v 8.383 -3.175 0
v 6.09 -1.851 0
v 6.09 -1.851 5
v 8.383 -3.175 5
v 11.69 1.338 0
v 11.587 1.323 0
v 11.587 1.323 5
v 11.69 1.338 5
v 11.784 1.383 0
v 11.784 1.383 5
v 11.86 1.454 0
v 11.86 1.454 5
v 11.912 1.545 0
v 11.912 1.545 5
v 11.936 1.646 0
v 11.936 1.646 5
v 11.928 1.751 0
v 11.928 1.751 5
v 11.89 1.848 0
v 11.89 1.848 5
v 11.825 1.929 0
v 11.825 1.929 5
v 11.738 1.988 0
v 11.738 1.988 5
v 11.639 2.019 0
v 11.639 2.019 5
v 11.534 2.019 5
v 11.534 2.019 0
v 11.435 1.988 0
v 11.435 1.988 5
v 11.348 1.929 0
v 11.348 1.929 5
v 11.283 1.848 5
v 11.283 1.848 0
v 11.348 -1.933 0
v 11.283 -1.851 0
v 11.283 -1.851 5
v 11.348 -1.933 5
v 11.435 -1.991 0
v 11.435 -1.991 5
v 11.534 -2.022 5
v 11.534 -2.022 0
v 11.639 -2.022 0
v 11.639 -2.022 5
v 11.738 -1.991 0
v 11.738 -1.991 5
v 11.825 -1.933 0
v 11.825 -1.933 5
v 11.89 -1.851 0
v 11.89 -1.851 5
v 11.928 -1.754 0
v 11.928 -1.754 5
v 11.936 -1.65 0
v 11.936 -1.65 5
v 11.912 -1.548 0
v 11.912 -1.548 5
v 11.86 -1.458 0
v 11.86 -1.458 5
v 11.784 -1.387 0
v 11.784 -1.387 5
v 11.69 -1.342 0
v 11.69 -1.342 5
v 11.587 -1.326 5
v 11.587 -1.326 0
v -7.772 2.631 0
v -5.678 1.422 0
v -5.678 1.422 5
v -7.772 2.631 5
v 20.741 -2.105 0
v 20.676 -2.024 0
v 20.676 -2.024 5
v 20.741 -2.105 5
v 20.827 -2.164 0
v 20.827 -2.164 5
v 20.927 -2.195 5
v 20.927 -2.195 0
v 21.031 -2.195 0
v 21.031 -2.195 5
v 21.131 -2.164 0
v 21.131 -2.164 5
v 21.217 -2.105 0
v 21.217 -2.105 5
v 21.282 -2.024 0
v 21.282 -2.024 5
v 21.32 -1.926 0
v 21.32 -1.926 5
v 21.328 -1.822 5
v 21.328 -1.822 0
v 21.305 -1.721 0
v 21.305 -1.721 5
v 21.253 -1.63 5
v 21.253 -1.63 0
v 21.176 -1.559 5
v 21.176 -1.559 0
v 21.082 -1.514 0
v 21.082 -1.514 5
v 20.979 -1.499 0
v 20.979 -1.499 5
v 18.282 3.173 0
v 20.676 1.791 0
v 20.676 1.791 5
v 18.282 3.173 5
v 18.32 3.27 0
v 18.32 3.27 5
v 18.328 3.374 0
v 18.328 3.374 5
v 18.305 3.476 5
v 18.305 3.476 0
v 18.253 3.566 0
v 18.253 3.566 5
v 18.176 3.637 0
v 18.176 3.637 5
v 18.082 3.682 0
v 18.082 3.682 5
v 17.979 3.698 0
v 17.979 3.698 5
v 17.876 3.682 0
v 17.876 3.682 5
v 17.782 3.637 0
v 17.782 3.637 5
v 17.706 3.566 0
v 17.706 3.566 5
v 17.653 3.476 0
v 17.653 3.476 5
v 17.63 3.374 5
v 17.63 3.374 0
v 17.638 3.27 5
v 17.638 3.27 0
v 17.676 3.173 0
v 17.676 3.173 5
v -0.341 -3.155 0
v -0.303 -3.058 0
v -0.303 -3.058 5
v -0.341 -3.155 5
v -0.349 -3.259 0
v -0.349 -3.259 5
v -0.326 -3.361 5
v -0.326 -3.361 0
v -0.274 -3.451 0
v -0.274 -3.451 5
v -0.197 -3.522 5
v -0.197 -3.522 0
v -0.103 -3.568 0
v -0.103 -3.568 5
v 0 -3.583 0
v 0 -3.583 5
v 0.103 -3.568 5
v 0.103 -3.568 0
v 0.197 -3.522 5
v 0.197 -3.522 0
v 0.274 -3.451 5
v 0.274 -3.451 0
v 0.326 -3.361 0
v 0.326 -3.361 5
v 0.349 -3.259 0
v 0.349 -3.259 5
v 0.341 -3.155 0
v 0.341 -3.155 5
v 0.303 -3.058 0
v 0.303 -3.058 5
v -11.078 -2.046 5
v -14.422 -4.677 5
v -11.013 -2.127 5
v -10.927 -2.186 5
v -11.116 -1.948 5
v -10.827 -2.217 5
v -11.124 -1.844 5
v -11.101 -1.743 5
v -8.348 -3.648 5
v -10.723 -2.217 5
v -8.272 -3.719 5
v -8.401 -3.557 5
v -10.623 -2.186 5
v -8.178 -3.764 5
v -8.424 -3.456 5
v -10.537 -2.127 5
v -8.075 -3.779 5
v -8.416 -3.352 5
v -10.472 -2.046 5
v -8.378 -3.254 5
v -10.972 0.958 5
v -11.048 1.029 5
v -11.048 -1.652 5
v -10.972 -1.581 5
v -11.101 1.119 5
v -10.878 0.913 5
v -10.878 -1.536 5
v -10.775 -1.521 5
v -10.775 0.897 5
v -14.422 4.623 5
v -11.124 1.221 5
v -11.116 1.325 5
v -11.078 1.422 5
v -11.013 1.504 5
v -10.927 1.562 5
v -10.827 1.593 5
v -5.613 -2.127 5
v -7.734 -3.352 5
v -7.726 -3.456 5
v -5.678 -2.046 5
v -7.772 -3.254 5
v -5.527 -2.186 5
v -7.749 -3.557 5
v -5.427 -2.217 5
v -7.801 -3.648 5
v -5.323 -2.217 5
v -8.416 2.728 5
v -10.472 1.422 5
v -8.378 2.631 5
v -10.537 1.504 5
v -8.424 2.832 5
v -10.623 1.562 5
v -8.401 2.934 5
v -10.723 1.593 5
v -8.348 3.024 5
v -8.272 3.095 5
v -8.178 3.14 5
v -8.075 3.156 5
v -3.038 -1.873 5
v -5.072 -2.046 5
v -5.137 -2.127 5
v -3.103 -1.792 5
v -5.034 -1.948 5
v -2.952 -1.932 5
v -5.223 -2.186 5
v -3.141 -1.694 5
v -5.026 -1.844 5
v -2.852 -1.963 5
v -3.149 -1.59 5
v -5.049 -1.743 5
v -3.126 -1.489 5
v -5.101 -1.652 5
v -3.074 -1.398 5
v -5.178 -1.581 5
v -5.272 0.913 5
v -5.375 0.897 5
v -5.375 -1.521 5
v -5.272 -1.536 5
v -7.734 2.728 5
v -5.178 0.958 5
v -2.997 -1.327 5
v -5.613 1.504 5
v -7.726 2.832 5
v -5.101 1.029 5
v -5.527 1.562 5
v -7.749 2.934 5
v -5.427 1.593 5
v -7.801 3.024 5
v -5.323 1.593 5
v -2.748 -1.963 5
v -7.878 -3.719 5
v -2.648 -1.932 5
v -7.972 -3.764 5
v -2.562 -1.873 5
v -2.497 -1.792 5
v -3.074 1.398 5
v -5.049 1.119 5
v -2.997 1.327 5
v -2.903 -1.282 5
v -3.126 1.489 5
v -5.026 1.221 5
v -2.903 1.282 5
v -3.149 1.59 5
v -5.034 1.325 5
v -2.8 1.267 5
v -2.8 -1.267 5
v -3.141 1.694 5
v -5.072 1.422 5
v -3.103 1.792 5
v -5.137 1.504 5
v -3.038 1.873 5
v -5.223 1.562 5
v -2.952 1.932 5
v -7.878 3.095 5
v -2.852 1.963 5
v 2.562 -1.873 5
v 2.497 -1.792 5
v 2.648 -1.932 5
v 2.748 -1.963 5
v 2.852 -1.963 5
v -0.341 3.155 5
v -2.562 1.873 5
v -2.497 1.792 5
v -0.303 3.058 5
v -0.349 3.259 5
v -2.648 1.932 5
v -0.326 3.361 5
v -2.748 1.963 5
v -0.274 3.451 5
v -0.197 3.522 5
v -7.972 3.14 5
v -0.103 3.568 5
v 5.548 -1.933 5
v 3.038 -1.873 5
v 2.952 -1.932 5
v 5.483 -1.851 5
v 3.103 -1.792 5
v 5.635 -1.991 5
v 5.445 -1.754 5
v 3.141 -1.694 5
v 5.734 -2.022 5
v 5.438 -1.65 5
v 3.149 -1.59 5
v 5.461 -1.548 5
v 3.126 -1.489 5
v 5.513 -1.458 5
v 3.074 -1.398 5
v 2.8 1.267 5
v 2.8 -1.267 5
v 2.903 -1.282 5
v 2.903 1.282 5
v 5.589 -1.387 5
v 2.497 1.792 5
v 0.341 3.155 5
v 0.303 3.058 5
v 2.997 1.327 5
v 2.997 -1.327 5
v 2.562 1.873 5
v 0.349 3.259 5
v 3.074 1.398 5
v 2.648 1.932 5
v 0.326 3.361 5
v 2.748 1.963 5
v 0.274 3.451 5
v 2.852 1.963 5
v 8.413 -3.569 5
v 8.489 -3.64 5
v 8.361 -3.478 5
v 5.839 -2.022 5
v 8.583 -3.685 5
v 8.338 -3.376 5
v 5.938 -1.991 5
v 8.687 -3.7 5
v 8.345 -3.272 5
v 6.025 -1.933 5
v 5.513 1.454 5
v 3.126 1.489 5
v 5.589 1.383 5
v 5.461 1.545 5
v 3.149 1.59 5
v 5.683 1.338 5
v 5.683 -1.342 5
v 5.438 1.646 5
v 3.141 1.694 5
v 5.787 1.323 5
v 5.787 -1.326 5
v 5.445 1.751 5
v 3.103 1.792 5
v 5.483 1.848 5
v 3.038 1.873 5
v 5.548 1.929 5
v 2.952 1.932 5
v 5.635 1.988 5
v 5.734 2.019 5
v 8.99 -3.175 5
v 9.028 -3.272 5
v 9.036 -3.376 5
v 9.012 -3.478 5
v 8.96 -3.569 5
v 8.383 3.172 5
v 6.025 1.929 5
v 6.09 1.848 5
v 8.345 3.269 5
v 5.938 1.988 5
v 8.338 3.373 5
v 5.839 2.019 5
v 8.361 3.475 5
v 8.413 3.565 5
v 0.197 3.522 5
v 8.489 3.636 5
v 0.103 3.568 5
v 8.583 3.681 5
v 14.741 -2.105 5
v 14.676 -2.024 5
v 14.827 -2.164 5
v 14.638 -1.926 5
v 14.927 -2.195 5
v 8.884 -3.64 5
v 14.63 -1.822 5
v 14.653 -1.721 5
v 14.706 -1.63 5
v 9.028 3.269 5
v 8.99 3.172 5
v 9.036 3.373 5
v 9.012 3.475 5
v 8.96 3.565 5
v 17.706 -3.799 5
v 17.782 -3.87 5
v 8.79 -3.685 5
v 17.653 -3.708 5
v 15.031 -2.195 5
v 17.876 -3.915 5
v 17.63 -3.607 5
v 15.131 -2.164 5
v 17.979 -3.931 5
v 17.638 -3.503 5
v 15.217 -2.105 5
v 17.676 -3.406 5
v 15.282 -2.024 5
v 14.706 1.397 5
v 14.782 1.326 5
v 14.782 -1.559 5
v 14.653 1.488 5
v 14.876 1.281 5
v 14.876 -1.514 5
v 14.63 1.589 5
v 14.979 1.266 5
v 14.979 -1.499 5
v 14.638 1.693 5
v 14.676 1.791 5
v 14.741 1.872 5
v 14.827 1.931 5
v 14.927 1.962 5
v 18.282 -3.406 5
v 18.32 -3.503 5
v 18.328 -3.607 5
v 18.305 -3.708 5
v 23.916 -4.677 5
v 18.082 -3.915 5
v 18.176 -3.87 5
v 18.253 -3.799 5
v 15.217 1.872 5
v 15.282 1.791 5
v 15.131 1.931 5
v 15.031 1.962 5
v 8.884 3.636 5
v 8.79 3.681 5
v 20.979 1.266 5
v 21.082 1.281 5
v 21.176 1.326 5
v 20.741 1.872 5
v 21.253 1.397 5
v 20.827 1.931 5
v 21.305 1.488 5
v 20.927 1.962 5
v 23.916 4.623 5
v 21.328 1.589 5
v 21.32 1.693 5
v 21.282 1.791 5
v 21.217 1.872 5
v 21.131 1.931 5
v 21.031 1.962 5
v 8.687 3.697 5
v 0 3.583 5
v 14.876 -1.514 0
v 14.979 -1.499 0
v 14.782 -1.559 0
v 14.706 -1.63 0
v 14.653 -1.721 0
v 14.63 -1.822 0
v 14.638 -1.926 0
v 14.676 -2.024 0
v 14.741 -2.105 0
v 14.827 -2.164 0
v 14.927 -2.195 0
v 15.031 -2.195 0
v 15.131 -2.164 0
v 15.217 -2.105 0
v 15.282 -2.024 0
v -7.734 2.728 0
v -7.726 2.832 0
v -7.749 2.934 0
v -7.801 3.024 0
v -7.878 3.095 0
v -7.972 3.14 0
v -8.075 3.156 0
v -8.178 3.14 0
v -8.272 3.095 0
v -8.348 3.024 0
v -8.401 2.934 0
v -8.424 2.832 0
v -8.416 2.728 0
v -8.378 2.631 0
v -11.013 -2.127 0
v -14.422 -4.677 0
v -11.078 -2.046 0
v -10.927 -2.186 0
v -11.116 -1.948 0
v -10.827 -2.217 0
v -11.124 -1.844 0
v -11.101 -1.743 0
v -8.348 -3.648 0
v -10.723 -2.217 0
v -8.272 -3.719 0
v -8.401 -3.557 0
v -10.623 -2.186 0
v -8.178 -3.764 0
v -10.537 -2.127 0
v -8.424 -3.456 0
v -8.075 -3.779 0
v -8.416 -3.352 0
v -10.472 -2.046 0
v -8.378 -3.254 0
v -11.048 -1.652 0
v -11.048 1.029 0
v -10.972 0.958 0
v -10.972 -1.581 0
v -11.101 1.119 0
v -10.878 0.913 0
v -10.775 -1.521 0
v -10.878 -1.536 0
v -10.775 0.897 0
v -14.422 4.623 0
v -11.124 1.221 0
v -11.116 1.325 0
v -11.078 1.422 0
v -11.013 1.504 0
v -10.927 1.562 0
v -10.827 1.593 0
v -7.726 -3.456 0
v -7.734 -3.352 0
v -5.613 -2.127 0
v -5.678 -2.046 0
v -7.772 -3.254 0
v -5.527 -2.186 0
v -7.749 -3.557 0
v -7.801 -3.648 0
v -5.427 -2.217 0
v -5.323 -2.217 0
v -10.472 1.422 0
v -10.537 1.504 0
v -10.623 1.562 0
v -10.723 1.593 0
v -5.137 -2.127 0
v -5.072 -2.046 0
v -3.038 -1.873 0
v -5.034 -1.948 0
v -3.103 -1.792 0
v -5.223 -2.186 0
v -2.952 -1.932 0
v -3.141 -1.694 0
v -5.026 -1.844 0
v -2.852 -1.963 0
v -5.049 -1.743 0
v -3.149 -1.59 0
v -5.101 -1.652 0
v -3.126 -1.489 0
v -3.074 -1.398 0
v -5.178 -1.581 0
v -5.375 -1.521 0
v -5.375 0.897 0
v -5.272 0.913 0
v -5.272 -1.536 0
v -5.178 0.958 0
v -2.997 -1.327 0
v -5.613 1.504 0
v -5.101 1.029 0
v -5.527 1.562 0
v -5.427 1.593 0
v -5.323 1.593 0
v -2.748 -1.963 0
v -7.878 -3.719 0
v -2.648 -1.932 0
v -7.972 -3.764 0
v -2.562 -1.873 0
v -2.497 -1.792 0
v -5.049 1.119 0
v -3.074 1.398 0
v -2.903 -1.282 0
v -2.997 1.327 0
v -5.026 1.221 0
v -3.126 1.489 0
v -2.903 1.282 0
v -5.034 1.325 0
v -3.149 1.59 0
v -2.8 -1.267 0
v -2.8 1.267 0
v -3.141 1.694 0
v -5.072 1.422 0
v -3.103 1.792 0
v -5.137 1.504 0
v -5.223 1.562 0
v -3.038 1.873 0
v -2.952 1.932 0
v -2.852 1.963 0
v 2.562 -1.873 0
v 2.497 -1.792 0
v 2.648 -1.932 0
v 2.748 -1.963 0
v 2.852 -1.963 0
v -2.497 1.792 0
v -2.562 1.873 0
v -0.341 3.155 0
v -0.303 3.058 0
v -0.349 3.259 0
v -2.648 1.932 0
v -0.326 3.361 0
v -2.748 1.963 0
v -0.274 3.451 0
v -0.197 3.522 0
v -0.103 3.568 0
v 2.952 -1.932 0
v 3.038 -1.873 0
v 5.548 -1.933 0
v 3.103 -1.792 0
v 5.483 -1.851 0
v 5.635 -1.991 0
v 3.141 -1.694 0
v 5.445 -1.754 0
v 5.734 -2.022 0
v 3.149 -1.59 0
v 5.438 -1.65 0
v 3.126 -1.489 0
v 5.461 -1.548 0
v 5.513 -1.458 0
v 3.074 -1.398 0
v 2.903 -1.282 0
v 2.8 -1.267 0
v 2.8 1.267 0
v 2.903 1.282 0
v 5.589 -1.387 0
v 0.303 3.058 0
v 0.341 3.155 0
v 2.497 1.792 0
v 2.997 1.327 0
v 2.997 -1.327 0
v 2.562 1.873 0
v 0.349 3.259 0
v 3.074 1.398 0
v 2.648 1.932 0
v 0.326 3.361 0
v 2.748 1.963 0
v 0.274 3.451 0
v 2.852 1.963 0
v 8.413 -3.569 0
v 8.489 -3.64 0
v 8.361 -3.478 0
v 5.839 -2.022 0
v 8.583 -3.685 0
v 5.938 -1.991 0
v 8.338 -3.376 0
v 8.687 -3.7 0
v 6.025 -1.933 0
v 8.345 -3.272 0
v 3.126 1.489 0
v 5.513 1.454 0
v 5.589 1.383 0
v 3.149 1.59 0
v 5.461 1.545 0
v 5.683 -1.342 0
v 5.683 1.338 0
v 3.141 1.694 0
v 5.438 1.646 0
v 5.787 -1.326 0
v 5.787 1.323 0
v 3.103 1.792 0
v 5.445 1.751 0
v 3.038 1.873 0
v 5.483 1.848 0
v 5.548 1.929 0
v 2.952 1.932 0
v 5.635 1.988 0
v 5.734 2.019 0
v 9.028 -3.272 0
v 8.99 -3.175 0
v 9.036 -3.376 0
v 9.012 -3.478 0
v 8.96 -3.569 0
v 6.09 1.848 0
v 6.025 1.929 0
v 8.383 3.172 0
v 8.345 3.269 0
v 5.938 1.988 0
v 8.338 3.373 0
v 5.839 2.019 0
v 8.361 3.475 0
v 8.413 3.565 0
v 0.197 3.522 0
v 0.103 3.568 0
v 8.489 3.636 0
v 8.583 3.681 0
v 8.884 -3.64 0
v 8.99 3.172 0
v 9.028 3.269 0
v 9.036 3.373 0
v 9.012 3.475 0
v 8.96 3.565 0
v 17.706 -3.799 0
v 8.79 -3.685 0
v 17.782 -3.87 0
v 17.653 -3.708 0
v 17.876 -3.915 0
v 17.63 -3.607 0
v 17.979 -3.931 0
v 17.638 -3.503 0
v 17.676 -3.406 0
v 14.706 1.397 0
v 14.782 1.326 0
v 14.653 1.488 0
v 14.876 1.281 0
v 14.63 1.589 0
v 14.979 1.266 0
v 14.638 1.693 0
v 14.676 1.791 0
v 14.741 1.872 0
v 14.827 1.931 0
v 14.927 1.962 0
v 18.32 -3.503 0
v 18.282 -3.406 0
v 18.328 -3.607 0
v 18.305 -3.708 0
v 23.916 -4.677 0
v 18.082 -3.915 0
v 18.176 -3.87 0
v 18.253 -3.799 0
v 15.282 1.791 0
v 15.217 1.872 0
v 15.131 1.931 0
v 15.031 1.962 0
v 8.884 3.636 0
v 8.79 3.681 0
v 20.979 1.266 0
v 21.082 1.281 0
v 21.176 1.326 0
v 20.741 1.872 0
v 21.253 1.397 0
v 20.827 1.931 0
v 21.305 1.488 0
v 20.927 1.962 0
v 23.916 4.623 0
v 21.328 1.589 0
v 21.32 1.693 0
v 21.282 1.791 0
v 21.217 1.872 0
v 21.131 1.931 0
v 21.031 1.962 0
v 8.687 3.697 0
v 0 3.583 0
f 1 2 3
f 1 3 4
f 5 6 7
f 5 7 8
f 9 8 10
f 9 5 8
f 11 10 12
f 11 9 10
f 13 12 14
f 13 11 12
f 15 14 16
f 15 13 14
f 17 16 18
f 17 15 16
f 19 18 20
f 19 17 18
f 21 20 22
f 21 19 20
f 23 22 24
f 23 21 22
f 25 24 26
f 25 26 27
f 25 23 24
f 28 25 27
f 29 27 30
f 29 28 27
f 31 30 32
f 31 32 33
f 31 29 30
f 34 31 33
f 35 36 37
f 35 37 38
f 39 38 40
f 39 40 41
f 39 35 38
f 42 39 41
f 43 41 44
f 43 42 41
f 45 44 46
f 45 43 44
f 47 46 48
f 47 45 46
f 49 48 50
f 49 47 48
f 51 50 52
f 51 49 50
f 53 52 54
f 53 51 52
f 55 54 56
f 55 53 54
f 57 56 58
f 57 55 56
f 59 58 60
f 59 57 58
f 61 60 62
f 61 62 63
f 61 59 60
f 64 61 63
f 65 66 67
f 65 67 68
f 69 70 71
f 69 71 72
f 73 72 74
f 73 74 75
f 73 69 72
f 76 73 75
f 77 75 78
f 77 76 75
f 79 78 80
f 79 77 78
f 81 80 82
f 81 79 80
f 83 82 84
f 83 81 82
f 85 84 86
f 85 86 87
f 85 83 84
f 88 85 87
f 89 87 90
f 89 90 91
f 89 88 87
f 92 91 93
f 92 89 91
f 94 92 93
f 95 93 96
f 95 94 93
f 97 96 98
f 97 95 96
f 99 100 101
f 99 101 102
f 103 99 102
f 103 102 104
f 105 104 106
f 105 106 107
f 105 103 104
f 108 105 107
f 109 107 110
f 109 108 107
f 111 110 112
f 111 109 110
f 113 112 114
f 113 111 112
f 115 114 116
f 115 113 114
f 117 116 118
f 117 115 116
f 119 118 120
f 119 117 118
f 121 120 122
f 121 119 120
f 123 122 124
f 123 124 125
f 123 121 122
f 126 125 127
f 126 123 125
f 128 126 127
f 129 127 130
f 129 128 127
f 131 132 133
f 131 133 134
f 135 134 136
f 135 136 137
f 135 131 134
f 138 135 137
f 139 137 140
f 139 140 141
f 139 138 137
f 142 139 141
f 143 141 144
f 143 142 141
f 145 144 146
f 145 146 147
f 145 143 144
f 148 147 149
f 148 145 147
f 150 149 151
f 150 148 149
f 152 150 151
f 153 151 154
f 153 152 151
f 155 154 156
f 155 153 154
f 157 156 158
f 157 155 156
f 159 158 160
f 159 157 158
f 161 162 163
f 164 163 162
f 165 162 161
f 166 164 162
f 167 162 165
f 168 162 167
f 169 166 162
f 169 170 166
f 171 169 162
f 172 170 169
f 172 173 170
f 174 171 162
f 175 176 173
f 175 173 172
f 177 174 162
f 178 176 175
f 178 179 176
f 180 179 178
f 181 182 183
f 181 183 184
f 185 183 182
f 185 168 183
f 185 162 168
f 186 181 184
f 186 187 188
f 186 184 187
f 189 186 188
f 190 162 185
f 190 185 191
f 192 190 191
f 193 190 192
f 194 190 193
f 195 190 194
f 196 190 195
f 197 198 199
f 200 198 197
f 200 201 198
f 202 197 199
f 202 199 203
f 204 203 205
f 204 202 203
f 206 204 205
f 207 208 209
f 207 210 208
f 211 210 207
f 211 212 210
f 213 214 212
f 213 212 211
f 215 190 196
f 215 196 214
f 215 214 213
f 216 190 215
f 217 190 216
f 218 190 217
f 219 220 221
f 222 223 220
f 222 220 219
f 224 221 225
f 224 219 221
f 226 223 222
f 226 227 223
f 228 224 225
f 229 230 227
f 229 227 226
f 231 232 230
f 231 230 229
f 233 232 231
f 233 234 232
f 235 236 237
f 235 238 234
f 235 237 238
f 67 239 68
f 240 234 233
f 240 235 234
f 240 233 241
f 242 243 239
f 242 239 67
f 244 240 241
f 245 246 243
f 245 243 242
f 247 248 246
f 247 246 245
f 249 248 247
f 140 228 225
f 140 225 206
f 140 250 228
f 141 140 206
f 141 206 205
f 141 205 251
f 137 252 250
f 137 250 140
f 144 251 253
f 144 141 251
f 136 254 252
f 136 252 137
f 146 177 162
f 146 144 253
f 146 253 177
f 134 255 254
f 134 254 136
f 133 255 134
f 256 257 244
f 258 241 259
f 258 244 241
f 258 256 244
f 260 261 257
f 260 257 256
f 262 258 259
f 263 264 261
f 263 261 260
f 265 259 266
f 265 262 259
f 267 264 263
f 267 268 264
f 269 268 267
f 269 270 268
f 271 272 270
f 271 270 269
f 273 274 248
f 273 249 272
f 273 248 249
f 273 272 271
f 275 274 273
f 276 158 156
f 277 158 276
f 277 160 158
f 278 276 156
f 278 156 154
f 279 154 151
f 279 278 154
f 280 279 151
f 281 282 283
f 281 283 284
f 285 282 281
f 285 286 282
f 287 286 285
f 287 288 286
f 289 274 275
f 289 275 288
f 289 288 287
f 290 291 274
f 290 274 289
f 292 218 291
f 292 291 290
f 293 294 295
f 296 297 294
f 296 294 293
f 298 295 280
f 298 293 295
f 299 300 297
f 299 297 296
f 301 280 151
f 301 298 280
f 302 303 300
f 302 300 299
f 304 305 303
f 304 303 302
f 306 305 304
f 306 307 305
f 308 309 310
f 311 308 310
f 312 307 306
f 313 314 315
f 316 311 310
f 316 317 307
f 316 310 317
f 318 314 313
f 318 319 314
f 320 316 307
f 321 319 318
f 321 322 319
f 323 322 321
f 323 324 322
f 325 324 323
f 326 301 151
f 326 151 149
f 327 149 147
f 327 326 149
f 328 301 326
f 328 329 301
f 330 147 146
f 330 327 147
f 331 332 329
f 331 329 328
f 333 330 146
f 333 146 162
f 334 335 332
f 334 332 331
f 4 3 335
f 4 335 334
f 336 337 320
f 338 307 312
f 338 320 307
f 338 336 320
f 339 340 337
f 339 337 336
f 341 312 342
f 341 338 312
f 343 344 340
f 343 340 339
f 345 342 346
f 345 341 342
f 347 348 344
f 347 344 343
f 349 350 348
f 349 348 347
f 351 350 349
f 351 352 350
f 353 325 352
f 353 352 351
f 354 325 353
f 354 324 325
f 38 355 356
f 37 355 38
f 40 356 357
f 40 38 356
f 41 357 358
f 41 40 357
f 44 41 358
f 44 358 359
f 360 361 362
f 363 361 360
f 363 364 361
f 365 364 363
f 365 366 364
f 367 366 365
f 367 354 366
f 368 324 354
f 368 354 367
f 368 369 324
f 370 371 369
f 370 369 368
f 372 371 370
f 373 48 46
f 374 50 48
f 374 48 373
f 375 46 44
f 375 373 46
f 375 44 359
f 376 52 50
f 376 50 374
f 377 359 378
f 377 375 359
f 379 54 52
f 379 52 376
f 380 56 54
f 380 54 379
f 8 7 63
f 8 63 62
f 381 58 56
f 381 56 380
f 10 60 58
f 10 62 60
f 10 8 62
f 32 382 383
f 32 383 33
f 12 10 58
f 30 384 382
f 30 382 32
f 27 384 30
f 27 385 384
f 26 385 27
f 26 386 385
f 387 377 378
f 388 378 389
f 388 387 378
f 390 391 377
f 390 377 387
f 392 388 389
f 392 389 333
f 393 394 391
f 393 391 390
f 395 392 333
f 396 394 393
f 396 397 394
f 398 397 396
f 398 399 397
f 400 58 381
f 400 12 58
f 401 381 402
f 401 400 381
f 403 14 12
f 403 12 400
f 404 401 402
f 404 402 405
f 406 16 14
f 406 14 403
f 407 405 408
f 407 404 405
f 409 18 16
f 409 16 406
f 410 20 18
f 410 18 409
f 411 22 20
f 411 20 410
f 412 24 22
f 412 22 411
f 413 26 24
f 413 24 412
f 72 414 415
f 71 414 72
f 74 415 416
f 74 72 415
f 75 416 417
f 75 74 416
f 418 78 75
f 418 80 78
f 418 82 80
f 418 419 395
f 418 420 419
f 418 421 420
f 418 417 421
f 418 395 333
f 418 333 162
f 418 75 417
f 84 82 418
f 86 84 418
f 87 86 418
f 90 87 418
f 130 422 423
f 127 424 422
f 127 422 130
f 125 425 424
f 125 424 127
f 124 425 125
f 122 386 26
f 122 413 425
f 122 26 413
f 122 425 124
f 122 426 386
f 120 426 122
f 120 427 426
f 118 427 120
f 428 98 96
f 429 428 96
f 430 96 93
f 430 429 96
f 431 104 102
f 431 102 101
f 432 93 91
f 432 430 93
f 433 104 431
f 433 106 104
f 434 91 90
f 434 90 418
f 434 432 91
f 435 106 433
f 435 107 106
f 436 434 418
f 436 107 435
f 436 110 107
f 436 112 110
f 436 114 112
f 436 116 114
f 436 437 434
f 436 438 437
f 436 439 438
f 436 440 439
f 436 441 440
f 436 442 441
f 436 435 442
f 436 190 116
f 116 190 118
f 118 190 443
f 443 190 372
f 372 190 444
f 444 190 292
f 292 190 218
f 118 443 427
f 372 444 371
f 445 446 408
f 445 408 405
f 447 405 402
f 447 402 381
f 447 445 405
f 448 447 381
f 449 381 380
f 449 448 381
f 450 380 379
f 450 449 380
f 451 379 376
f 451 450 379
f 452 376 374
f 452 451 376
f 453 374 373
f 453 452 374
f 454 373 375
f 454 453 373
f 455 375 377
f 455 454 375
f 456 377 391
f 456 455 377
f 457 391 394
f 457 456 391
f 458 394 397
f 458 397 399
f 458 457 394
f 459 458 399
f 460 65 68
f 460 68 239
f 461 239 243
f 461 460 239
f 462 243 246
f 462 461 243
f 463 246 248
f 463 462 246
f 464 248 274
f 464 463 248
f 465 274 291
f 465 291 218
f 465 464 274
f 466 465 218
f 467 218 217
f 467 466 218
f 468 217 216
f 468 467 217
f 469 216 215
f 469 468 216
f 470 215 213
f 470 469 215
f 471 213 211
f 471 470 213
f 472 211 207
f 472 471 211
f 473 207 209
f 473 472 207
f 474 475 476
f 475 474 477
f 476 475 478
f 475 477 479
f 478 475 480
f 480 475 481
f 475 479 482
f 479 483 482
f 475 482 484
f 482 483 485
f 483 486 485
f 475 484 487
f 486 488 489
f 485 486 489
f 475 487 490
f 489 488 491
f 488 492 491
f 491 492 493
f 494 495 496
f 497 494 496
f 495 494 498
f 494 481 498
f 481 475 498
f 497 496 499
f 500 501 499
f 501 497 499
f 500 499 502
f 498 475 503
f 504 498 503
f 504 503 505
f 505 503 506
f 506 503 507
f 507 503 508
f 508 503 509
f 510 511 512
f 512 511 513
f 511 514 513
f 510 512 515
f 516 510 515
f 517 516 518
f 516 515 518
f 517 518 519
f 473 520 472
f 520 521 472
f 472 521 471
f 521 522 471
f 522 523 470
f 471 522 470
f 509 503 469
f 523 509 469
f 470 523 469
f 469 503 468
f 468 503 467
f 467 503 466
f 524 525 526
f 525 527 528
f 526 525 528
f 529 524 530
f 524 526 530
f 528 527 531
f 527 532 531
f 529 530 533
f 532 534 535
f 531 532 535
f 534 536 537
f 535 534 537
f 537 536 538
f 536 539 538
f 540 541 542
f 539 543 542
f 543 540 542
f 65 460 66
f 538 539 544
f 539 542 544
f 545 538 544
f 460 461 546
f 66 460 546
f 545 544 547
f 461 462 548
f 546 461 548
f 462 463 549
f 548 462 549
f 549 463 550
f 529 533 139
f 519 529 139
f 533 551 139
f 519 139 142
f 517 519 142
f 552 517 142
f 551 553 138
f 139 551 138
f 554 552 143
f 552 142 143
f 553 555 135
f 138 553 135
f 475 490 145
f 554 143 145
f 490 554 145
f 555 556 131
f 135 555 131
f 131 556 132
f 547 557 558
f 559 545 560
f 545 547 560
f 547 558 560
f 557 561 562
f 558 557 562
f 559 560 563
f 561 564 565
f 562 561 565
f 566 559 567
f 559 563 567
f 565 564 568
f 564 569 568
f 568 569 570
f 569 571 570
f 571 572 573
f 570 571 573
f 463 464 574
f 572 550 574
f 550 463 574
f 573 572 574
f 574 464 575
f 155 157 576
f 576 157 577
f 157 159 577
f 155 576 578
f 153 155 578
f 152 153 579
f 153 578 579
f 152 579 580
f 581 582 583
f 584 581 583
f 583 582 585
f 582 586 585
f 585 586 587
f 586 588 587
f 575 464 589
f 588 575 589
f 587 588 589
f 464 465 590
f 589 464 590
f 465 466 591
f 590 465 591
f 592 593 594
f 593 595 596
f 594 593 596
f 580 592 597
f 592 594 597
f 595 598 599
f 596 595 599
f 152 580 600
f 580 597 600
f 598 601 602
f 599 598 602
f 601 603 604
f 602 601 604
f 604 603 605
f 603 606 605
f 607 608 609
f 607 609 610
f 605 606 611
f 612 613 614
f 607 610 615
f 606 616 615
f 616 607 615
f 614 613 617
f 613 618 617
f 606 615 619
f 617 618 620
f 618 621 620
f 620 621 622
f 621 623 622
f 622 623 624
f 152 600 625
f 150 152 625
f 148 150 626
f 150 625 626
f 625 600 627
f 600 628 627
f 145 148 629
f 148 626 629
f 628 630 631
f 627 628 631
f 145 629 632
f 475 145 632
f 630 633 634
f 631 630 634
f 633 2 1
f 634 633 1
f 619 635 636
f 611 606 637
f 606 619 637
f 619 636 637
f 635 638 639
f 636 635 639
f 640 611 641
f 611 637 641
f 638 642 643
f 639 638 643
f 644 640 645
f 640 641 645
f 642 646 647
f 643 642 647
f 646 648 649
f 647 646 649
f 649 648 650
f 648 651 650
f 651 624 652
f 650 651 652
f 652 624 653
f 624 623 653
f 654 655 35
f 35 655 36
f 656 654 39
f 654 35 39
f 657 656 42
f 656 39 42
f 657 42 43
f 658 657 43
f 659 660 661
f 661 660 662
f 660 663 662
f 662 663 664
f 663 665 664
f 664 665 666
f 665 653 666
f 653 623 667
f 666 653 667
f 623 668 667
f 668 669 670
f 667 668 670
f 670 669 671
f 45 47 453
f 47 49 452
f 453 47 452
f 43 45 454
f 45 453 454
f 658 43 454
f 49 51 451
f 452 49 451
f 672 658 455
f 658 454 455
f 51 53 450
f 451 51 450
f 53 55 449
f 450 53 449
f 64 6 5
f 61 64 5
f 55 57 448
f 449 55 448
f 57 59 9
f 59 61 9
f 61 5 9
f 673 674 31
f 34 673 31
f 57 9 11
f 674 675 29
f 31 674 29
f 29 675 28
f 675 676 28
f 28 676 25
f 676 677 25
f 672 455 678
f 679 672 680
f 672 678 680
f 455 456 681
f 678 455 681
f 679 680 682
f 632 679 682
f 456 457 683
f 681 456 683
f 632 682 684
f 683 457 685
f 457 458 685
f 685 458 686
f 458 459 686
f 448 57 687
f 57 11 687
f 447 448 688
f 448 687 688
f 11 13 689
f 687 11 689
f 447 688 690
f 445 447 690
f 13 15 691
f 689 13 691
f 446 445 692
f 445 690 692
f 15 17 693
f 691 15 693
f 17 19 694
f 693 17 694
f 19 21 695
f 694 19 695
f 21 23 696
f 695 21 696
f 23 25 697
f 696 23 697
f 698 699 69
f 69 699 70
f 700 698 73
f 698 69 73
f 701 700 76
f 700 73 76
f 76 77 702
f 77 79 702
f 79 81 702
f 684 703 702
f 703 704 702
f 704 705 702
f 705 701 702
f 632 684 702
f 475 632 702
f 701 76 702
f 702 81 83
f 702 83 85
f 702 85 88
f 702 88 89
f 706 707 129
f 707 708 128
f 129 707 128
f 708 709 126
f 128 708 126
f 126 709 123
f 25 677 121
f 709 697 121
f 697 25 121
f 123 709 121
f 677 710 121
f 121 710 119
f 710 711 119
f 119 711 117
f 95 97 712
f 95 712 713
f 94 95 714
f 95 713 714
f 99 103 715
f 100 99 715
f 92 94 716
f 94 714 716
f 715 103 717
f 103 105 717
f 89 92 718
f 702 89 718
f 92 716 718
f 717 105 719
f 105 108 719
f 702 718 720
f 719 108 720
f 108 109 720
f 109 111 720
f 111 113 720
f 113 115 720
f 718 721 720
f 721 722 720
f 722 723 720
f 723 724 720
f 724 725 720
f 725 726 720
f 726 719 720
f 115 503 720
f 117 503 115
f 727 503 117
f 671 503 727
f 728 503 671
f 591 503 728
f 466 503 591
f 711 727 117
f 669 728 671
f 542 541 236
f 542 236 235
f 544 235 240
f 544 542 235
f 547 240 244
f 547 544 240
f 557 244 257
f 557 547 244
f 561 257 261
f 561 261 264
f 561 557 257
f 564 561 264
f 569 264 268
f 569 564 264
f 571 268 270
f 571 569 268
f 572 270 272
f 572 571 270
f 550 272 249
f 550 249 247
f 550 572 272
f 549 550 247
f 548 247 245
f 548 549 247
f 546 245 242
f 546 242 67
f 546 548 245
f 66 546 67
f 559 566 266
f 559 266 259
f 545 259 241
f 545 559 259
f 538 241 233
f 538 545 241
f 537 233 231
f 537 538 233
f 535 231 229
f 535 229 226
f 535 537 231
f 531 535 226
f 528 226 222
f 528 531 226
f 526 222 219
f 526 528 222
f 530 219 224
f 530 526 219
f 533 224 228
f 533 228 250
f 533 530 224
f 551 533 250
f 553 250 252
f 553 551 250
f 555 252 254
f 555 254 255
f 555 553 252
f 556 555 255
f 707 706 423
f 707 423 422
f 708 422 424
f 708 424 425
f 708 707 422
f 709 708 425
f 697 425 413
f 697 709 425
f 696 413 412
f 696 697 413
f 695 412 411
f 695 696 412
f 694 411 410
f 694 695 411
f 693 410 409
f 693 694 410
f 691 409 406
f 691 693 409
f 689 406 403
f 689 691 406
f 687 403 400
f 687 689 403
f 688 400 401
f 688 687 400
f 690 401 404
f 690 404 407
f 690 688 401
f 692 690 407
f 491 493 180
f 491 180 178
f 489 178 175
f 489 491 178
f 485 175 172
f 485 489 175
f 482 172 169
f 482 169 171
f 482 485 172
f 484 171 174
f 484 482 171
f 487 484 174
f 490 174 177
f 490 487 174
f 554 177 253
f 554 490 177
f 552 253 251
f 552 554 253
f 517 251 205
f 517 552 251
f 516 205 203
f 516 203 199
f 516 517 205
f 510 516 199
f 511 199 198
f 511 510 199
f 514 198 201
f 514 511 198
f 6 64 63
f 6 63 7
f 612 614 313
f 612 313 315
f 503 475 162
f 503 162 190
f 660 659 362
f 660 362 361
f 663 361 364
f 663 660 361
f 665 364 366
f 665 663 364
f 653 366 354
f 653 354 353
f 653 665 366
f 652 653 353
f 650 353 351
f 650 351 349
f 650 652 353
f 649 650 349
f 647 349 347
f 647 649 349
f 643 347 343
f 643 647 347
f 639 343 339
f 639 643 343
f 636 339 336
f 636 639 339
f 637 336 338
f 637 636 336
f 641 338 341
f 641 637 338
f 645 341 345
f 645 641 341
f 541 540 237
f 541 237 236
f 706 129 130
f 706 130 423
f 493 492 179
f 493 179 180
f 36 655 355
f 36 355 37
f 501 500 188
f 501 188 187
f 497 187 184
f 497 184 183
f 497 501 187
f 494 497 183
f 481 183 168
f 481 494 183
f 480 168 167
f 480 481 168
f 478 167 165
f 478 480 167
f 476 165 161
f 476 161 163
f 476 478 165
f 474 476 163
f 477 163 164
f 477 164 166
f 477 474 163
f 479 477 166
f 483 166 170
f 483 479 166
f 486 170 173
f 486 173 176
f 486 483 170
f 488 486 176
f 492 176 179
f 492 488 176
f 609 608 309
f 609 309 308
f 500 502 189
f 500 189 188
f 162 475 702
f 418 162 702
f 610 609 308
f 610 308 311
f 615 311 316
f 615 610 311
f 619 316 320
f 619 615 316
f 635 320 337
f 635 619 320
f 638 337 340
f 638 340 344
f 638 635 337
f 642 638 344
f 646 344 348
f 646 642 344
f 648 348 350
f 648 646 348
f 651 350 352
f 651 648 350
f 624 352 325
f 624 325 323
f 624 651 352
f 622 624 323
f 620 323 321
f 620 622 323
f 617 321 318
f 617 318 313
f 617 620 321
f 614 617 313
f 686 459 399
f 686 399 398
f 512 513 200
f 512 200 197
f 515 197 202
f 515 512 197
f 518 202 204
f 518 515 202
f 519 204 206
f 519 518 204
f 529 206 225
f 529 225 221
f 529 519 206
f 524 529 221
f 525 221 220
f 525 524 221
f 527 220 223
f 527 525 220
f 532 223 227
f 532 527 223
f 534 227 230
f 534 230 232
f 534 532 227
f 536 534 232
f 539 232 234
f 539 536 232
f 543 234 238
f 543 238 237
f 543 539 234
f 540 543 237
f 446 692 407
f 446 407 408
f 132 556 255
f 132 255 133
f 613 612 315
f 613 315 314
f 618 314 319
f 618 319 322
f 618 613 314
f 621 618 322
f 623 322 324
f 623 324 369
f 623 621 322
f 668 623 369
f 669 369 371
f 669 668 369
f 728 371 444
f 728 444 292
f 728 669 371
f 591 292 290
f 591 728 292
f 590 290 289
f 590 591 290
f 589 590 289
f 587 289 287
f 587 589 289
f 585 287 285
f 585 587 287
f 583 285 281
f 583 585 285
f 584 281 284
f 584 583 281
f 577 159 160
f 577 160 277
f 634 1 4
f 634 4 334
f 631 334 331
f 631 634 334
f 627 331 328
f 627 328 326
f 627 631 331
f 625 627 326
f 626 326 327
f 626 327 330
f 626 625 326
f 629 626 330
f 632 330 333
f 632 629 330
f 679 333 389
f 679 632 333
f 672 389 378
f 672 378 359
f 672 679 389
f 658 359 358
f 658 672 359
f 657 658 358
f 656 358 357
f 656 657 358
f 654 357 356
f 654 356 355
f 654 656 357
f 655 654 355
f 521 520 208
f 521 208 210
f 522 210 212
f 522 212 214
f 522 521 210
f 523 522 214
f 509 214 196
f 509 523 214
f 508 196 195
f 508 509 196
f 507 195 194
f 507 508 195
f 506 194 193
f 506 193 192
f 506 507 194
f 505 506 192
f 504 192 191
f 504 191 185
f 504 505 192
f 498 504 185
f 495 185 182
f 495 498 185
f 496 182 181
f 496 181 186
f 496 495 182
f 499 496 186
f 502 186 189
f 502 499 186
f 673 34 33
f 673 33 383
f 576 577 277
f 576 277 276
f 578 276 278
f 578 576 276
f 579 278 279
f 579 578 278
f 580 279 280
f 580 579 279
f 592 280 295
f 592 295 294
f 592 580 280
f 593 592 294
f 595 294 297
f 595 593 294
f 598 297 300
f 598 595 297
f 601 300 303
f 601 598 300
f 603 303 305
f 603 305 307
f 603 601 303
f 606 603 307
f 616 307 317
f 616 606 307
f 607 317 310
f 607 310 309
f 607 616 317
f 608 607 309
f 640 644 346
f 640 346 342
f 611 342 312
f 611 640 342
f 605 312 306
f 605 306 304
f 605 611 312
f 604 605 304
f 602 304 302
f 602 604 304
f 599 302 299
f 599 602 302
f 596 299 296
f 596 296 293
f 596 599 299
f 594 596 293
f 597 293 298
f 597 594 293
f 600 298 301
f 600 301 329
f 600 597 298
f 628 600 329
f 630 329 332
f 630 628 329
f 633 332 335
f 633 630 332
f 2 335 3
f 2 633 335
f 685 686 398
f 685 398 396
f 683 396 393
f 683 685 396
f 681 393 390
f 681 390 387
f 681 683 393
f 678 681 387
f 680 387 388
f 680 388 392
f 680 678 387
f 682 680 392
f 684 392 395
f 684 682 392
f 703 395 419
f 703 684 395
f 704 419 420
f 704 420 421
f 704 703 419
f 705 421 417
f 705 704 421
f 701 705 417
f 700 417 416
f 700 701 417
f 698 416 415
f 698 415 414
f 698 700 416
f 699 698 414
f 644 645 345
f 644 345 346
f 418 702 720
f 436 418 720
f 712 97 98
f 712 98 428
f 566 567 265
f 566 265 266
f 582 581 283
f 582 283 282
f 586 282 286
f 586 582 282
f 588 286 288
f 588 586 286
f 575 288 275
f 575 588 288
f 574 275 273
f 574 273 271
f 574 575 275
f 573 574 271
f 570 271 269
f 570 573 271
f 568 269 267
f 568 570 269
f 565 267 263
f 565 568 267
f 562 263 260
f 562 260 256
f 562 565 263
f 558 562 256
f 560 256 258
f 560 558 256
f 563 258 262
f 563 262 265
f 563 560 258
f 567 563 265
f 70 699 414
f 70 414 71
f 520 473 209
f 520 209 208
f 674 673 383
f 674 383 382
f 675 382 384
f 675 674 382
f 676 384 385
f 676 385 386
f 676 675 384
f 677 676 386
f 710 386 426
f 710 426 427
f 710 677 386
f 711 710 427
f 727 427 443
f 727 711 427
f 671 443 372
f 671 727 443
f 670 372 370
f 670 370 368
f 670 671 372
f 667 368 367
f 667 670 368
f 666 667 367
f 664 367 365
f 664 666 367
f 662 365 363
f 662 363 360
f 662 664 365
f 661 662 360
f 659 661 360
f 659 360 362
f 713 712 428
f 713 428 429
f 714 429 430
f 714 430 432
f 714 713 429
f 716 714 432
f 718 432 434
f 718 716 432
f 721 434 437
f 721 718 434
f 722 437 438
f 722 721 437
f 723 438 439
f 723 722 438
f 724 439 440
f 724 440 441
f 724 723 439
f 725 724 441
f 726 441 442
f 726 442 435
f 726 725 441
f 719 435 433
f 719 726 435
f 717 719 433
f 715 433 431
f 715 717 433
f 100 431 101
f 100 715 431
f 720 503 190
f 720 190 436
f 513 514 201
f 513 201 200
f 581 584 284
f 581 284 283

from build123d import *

# Parameters (mm, degrees)
SKETCH1_W           = 38.338603818
SKETCH1_H           = 9.300852407
BOSS_EXTRUDE1_DEPTH = 5


with BuildPart() as part:
    # Sketch1 → Boss-Extrude1 (new body)
    with BuildSketch(Plane.XY):
        with Locations((4.747182706, -0.026965663)):
            Rectangle(SKETCH1_W, SKETCH1_H)
        with BuildLine():
            Line((-8.377929756, 2.630922308), (-10.471711974, 1.422076581))
            ThreePointArc((-10.471711974, 1.422076581), (-11.077929756, 1.422076581), (-10.774820865, 0.897076581))
            Line((-10.774820865, 0.897076581), (-10.774820865, -1.520614872))
            ThreePointArc((-10.774820865, -1.520614872), (-11.077929756, -2.045614872), (-10.471711974, -2.045614872))
            Line((-10.471711974, -2.045614872), (-8.377929756, -3.254460599))
            ThreePointArc((-8.377929756, -3.254460599), (-8.074820865, -3.779460599), (-7.771711974, -3.254460599))
            Line((-7.771711974, -3.254460599), (-5.677929756, -2.045614872))
            ThreePointArc((-5.677929756, -2.045614872), (-5.071711974, -2.045614872), (-5.374820865, -1.520614872))
            Line((-5.374820865, -1.520614872), (-5.374820865, 0.897076581))
            ThreePointArc((-5.374820865, 0.897076581), (-5.071711974, 1.422076581), (-5.677929756, 1.422076581))
            Line((-5.677929756, 1.422076581), (-7.771711974, 2.630922308))
            ThreePointArc((-7.771711974, 2.630922308), (-8.074820865, 3.155922308), (-8.377929756, 2.630922308))
        make_face(mode=Mode.SUBTRACT)
        with BuildLine():
            Line((-0.303108891, 3.058161507), (-2.496891109, 1.791580754))
            ThreePointArc((-2.496891109, 1.791580754), (-3.103108891, 1.791580754), (-2.8, 1.266580754))
            Line((-2.8, 1.266580754), (-2.8, -1.266580754))
            ThreePointArc((-2.8, -1.266580754), (-3.103108891, -1.791580754), (-2.496891109, -1.791580754))
            Line((-2.496891109, -1.791580754), (-0.303108891, -3.058161507))
            ThreePointArc((-0.303108891, -3.058161507), (0, -3.583161507), (0.303108891, -3.058161507))
            Line((0.303108891, -3.058161507), (2.496891109, -1.791580754))
            ThreePointArc((2.496891109, -1.791580754), (3.103108891, -1.791580754), (2.8, -1.266580754))
            Line((2.8, -1.266580754), (2.8, 1.266580754))
            ThreePointArc((2.8, 1.266580754), (3.103108891, 1.791580754), (2.496891109, 1.791580754))
            Line((2.496891109, 1.791580754), (0.303108891, 3.058161507))
            ThreePointArc((0.303108891, 3.058161507), (0, 3.583161507), (-0.303108891, 3.058161507))
        make_face(mode=Mode.SUBTRACT)
        with BuildLine():
            Line((8.383417443, 3.171942265), (6.089635226, 1.847626484))
            ThreePointArc((6.089635226, 1.847626484), (5.483417443, 1.847626484), (5.786526334, 1.322626484))
            Line((5.786526334, 1.322626484), (5.786526334, -1.326005077))
            ThreePointArc((5.786526334, -1.326005077), (5.483417443, -1.851005077), (6.089635226, -1.851005077))
            Line((6.089635226, -1.851005077), (8.383417443, -3.175320858))
            ThreePointArc((8.383417443, -3.175320858), (8.686526334, -3.700320858), (8.989635226, -3.175320858))
            Line((8.989635226, -3.175320858), (11.283417443, -1.851005077))
            ThreePointArc((11.283417443, -1.851005077), (11.889635226, -1.851005077), (11.586526334, -1.326005077))
            Line((11.586526334, -1.326005077), (11.586526334, 1.322626484))
            ThreePointArc((11.586526334, 1.322626484), (11.889635226, 1.847626484), (11.283417443, 1.847626484))
            Line((11.283417443, 1.847626484), (8.989635226, 3.171942265))
            ThreePointArc((8.989635226, 3.171942265), (8.686526334, 3.696942265), (8.383417443, 3.171942265))
        make_face(mode=Mode.SUBTRACT)
        with BuildLine():
            Line((17.676043737, 3.17263624), (15.28226152, 1.790585433))
            ThreePointArc((15.28226152, 1.790585433), (14.676043737, 1.790585433), (14.979152629, 1.265585433))
            Line((14.979152629, 1.265585433), (14.979152629, -1.498516182))
            ThreePointArc((14.979152629, -1.498516182), (14.676043737, -2.023516182), (15.28226152, -2.023516182))
            Line((15.28226152, -2.023516182), (17.676043737, -3.40556699))
            ThreePointArc((17.676043737, -3.40556699), (17.979152629, -3.93056699), (18.28226152, -3.40556699))
            Line((18.28226152, -3.40556699), (20.676043737, -2.023516182))
            ThreePointArc((20.676043737, -2.023516182), (21.28226152, -2.023516182), (20.979152629, -1.498516182))
            Line((20.979152629, -1.498516182), (20.979152629, 1.265585433))
            ThreePointArc((20.979152629, 1.265585433), (21.28226152, 1.790585433), (20.676043737, 1.790585433))
            Line((20.676043737, 1.790585433), (18.28226152, 3.17263624))
            ThreePointArc((18.28226152, 3.17263624), (17.979152629, 3.69763624), (17.676043737, 3.17263624))
        make_face(mode=Mode.SUBTRACT)
    extrude(amount=BOSS_EXTRUDE1_DEPTH)


solid = part.part
